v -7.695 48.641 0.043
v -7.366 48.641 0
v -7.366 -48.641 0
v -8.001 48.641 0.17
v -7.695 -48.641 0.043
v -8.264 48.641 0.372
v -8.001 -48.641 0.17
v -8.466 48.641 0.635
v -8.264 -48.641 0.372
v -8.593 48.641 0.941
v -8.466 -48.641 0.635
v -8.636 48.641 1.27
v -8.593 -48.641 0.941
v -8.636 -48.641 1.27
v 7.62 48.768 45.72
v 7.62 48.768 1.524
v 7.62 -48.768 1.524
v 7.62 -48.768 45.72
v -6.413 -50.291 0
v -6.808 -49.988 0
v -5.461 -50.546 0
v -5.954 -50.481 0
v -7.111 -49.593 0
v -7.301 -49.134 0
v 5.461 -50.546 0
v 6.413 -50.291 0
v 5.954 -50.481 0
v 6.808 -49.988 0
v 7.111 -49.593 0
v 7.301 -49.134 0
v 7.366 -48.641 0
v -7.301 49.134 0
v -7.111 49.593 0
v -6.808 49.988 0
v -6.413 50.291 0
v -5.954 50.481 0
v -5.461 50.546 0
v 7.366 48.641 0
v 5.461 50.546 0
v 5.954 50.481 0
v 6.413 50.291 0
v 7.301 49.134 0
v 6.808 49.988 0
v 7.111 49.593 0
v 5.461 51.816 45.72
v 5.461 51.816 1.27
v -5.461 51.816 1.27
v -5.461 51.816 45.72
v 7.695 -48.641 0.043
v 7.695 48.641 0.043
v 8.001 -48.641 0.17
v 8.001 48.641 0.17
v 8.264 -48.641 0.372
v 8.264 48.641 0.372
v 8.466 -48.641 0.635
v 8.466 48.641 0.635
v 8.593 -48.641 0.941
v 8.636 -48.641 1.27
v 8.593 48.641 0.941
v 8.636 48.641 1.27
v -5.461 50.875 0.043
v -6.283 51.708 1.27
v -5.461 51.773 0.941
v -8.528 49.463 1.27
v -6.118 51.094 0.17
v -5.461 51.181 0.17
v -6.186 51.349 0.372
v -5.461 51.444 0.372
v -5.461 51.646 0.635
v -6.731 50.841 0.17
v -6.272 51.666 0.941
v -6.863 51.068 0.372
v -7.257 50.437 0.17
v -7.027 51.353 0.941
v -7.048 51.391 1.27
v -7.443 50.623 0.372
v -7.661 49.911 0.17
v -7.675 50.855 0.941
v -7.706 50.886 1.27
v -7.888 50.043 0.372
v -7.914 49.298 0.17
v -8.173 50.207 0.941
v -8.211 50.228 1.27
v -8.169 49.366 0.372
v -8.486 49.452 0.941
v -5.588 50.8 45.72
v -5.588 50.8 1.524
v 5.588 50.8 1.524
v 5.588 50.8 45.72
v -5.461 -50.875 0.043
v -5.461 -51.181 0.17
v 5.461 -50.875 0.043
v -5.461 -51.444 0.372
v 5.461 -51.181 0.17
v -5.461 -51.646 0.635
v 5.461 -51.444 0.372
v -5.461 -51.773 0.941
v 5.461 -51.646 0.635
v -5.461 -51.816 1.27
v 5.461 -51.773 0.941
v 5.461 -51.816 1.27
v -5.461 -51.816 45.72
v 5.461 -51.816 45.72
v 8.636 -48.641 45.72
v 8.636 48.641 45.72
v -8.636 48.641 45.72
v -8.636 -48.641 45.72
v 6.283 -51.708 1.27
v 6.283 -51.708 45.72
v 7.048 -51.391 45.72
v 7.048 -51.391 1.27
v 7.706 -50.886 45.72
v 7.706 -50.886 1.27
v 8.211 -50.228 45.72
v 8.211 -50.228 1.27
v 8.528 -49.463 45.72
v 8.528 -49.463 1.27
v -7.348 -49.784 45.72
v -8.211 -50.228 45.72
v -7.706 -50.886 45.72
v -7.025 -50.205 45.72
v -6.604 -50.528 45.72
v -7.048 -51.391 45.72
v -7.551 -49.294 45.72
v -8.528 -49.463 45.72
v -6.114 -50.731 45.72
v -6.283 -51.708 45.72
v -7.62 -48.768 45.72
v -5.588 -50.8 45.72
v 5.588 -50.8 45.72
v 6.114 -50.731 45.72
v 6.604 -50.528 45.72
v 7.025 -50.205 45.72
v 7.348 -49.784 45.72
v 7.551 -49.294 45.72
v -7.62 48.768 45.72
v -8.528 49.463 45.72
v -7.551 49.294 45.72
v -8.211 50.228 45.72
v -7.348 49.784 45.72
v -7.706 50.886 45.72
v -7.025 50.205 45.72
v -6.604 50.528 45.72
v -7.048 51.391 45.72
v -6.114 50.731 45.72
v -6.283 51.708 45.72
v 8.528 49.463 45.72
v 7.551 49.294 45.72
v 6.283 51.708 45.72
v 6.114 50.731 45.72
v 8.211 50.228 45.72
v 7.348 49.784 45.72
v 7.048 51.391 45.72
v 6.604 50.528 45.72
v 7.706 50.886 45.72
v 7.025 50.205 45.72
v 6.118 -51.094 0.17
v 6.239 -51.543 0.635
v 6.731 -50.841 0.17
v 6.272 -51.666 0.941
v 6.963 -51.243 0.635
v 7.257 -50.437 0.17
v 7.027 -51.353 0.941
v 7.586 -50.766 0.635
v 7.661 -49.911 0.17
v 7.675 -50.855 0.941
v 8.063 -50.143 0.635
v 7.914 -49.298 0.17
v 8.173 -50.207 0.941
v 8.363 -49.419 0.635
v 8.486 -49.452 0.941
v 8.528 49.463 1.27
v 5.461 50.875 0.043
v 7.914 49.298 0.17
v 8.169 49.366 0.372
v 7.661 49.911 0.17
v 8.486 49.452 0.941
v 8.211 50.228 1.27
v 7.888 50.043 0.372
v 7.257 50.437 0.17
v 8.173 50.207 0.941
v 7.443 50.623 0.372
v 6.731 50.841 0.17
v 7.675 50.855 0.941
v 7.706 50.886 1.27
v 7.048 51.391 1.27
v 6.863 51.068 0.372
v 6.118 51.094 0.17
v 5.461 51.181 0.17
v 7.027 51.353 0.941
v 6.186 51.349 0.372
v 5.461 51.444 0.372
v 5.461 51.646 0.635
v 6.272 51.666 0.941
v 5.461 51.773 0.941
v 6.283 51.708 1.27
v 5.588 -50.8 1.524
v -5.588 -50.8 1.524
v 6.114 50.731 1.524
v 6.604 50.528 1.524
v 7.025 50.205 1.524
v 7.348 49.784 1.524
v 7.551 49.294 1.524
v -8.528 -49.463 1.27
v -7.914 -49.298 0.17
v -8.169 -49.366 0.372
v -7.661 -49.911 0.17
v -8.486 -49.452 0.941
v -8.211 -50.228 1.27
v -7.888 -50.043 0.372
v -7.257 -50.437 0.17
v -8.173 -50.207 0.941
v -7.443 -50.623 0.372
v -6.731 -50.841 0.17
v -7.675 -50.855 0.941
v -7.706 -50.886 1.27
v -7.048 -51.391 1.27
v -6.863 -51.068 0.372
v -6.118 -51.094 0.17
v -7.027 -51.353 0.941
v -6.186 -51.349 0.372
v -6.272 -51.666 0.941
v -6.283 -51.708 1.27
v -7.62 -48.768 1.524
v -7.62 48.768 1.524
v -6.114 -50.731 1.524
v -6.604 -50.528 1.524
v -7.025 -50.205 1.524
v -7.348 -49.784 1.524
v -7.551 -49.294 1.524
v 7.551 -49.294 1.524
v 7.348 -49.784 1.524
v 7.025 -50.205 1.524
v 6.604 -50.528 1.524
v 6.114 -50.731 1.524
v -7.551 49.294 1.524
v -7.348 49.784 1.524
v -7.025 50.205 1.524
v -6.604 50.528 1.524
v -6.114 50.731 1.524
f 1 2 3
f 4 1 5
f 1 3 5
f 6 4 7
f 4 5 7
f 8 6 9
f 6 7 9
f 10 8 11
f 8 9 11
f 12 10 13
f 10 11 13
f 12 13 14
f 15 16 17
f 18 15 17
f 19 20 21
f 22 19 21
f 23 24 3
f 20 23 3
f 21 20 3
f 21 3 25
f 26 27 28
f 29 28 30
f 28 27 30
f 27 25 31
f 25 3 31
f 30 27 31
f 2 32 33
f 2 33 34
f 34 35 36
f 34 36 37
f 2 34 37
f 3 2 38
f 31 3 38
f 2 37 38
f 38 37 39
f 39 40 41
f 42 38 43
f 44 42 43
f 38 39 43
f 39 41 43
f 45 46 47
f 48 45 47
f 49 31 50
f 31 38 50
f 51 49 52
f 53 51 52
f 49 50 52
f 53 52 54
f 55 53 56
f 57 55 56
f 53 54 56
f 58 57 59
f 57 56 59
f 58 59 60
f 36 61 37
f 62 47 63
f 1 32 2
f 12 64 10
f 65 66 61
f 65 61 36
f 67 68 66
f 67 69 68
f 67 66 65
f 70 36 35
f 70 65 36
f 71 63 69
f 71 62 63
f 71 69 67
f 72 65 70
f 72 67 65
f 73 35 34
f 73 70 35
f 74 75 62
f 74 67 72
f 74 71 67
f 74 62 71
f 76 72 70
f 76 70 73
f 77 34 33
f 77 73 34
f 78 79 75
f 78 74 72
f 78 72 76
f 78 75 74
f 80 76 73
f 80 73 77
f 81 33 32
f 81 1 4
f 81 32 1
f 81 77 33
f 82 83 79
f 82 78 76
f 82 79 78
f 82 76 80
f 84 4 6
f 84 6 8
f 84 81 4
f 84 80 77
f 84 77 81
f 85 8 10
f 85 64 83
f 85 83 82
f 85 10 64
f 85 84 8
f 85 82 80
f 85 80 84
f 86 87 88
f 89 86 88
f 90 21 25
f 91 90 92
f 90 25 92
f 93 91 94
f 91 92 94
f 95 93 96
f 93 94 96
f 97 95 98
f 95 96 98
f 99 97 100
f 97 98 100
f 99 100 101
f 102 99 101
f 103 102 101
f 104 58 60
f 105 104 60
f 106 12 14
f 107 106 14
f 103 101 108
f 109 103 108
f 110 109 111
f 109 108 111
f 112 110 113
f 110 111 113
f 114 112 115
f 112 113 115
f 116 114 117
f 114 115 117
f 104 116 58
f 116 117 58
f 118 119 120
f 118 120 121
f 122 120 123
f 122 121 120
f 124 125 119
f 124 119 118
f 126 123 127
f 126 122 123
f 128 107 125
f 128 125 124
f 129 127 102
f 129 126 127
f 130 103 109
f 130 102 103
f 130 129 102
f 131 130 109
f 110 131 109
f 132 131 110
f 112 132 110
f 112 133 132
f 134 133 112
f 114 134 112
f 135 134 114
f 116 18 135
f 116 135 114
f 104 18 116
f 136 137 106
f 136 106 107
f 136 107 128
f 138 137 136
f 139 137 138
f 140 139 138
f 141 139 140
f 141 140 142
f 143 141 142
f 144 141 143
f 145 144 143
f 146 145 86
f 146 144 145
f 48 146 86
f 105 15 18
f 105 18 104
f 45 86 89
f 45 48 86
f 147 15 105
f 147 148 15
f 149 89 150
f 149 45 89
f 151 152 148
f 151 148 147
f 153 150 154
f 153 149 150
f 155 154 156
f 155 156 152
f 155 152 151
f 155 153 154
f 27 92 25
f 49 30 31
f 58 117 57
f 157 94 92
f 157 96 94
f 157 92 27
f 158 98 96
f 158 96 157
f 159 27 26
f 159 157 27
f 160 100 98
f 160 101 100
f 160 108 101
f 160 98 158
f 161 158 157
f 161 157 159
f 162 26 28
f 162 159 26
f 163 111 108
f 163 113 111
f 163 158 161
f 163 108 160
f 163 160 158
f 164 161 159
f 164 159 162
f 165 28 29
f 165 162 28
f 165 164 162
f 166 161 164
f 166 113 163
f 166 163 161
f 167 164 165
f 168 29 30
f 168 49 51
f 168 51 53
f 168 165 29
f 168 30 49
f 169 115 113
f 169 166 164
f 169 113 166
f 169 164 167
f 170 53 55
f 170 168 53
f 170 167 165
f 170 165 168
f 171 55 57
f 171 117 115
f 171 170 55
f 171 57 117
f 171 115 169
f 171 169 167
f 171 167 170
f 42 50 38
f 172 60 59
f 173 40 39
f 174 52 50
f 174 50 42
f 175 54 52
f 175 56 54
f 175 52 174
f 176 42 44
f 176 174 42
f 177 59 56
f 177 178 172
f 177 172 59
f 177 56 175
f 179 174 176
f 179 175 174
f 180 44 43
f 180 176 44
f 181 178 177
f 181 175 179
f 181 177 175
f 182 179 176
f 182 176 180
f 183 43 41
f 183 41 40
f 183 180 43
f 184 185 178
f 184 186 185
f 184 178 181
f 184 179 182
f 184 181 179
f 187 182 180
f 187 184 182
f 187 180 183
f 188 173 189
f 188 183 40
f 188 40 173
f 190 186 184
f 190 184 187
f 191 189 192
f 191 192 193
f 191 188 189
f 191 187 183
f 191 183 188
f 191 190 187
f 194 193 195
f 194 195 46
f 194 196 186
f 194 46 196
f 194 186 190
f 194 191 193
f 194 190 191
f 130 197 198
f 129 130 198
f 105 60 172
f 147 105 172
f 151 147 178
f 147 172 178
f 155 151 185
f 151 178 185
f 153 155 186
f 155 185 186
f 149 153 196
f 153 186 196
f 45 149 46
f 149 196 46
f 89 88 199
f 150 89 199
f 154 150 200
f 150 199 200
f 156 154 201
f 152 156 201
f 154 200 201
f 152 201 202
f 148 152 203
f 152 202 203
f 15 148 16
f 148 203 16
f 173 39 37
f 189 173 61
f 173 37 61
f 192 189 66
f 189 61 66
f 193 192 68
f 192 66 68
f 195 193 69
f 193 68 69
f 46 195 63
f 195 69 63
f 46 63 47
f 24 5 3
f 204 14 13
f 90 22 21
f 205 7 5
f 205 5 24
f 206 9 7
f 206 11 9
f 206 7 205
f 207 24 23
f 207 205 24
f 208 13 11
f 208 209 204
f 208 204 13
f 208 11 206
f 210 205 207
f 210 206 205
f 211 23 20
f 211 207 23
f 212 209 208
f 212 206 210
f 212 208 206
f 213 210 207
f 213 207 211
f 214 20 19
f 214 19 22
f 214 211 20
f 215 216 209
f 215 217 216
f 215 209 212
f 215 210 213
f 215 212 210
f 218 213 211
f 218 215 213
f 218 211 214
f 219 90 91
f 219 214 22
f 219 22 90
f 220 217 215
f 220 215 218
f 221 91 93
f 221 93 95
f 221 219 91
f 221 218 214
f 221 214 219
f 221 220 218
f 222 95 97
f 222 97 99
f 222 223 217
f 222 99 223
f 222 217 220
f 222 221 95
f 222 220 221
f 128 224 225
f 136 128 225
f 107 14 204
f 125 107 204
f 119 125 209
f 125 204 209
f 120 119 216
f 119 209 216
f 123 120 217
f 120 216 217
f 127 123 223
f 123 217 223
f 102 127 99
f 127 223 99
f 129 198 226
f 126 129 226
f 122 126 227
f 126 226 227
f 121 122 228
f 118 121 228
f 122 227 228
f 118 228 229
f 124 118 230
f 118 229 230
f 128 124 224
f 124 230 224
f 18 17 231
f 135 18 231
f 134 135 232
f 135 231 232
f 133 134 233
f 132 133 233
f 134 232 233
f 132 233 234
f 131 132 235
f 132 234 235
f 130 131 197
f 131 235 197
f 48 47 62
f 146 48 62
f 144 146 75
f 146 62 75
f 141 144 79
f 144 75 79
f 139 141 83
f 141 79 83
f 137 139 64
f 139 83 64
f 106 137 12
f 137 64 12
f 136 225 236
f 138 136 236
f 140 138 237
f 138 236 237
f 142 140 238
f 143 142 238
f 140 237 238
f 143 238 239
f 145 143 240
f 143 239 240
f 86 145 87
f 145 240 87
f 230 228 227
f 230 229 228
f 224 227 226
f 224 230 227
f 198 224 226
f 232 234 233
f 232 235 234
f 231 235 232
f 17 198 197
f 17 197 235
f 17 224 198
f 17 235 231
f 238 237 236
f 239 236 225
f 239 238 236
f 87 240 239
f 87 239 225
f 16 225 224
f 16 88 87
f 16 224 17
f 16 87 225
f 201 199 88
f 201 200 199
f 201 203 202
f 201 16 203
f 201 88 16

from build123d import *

# Parameters (mm, degrees)
F1_DEPTH = 1.524
F3_DEPTH = 44.196
F4_R     = 1.27


with BuildPart() as f1:
    # F0 (on Top) → F1 (new body)
    with BuildSketch(Plane.XY):
        with BuildLine():
            Line((5.461, 51.816), (-5.461, 51.816))
            ThreePointArc((-5.461, 51.816), (-7.706064, 50.886064), (-8.636, 48.641))
            Line((-8.636, 48.641), (-8.636, -48.641))
            ThreePointArc((-8.636, -48.641), (-7.706064, -50.886064), (-5.461, -51.816))
            Line((-5.461, -51.816), (5.461, -51.816))
            ThreePointArc((5.461, -51.816), (7.706064, -50.886064), (8.636, -48.641))
            Line((8.636, -48.641), (8.636, 48.641))
            ThreePointArc((8.636, 48.641), (7.706064, 50.886064), (5.461, 51.816))
        make_face()
    extrude(amount=F1_DEPTH)

    # F2 (on face) → F3 (join)
    with BuildSketch(Plane.XY.offset(1.524)):
        with BuildLine():
            ThreePointArc((5.461, -51.816), (7.706064, -50.886064), (8.636, -48.641))
            Line((8.636, -48.641), (8.636, 48.641))
            ThreePointArc((8.636, 48.641), (7.706064, 50.886064), (5.461, 51.816))
            Line((5.461, 51.816), (-5.461, 51.816))
            ThreePointArc((-5.461, 51.816), (-7.706064, 50.886064), (-8.636, 48.641))
            Line((-8.636, 48.641), (-8.636, -48.641))
            ThreePointArc((-8.636, -48.641), (-7.706064, -50.886064), (-5.461, -51.816))
            Line((-5.461, -51.816), (5.461, -51.816))
        make_face()
        with BuildLine():
            ThreePointArc((-7.62, 48.768), (-7.024841, 50.204841), (-5.588, 50.8))
            Line((-5.588, 50.8), (5.588, 50.8))
            ThreePointArc((5.588, 50.8), (7.024841, 50.204841), (7.62, 48.768))
            Line((7.62, 48.768), (7.62, -48.768))
            ThreePointArc((7.62, -48.768), (7.024841, -50.204841), (5.588, -50.8))
            Line((5.588, -50.8), (-5.588, -50.8))
            ThreePointArc((-5.588, -50.8), (-7.024841, -50.204841), (-7.62, -48.768))
            Line((-7.62, -48.768), (-7.62, 48.768))
        make_face(mode=Mode.SUBTRACT)
    extrude(amount=F3_DEPTH)

    # F4
    f4_edges = [f1.edges().sort_by_distance(p)[0] for p in [
        (8.636, 0, 0),
        (7.706064, 50.886064, 0),
        (0, 51.816, 0),
        (-7.706064, 50.886064, 0),
        (-8.636, 0, 0),
        (-7.706064, -50.886064, 0),
        (0, -51.816, 0),
        (7.706064, -50.886064, 0),
    ]]
    fillet(f4_edges, radius=F4_R)


solid = f1.part
